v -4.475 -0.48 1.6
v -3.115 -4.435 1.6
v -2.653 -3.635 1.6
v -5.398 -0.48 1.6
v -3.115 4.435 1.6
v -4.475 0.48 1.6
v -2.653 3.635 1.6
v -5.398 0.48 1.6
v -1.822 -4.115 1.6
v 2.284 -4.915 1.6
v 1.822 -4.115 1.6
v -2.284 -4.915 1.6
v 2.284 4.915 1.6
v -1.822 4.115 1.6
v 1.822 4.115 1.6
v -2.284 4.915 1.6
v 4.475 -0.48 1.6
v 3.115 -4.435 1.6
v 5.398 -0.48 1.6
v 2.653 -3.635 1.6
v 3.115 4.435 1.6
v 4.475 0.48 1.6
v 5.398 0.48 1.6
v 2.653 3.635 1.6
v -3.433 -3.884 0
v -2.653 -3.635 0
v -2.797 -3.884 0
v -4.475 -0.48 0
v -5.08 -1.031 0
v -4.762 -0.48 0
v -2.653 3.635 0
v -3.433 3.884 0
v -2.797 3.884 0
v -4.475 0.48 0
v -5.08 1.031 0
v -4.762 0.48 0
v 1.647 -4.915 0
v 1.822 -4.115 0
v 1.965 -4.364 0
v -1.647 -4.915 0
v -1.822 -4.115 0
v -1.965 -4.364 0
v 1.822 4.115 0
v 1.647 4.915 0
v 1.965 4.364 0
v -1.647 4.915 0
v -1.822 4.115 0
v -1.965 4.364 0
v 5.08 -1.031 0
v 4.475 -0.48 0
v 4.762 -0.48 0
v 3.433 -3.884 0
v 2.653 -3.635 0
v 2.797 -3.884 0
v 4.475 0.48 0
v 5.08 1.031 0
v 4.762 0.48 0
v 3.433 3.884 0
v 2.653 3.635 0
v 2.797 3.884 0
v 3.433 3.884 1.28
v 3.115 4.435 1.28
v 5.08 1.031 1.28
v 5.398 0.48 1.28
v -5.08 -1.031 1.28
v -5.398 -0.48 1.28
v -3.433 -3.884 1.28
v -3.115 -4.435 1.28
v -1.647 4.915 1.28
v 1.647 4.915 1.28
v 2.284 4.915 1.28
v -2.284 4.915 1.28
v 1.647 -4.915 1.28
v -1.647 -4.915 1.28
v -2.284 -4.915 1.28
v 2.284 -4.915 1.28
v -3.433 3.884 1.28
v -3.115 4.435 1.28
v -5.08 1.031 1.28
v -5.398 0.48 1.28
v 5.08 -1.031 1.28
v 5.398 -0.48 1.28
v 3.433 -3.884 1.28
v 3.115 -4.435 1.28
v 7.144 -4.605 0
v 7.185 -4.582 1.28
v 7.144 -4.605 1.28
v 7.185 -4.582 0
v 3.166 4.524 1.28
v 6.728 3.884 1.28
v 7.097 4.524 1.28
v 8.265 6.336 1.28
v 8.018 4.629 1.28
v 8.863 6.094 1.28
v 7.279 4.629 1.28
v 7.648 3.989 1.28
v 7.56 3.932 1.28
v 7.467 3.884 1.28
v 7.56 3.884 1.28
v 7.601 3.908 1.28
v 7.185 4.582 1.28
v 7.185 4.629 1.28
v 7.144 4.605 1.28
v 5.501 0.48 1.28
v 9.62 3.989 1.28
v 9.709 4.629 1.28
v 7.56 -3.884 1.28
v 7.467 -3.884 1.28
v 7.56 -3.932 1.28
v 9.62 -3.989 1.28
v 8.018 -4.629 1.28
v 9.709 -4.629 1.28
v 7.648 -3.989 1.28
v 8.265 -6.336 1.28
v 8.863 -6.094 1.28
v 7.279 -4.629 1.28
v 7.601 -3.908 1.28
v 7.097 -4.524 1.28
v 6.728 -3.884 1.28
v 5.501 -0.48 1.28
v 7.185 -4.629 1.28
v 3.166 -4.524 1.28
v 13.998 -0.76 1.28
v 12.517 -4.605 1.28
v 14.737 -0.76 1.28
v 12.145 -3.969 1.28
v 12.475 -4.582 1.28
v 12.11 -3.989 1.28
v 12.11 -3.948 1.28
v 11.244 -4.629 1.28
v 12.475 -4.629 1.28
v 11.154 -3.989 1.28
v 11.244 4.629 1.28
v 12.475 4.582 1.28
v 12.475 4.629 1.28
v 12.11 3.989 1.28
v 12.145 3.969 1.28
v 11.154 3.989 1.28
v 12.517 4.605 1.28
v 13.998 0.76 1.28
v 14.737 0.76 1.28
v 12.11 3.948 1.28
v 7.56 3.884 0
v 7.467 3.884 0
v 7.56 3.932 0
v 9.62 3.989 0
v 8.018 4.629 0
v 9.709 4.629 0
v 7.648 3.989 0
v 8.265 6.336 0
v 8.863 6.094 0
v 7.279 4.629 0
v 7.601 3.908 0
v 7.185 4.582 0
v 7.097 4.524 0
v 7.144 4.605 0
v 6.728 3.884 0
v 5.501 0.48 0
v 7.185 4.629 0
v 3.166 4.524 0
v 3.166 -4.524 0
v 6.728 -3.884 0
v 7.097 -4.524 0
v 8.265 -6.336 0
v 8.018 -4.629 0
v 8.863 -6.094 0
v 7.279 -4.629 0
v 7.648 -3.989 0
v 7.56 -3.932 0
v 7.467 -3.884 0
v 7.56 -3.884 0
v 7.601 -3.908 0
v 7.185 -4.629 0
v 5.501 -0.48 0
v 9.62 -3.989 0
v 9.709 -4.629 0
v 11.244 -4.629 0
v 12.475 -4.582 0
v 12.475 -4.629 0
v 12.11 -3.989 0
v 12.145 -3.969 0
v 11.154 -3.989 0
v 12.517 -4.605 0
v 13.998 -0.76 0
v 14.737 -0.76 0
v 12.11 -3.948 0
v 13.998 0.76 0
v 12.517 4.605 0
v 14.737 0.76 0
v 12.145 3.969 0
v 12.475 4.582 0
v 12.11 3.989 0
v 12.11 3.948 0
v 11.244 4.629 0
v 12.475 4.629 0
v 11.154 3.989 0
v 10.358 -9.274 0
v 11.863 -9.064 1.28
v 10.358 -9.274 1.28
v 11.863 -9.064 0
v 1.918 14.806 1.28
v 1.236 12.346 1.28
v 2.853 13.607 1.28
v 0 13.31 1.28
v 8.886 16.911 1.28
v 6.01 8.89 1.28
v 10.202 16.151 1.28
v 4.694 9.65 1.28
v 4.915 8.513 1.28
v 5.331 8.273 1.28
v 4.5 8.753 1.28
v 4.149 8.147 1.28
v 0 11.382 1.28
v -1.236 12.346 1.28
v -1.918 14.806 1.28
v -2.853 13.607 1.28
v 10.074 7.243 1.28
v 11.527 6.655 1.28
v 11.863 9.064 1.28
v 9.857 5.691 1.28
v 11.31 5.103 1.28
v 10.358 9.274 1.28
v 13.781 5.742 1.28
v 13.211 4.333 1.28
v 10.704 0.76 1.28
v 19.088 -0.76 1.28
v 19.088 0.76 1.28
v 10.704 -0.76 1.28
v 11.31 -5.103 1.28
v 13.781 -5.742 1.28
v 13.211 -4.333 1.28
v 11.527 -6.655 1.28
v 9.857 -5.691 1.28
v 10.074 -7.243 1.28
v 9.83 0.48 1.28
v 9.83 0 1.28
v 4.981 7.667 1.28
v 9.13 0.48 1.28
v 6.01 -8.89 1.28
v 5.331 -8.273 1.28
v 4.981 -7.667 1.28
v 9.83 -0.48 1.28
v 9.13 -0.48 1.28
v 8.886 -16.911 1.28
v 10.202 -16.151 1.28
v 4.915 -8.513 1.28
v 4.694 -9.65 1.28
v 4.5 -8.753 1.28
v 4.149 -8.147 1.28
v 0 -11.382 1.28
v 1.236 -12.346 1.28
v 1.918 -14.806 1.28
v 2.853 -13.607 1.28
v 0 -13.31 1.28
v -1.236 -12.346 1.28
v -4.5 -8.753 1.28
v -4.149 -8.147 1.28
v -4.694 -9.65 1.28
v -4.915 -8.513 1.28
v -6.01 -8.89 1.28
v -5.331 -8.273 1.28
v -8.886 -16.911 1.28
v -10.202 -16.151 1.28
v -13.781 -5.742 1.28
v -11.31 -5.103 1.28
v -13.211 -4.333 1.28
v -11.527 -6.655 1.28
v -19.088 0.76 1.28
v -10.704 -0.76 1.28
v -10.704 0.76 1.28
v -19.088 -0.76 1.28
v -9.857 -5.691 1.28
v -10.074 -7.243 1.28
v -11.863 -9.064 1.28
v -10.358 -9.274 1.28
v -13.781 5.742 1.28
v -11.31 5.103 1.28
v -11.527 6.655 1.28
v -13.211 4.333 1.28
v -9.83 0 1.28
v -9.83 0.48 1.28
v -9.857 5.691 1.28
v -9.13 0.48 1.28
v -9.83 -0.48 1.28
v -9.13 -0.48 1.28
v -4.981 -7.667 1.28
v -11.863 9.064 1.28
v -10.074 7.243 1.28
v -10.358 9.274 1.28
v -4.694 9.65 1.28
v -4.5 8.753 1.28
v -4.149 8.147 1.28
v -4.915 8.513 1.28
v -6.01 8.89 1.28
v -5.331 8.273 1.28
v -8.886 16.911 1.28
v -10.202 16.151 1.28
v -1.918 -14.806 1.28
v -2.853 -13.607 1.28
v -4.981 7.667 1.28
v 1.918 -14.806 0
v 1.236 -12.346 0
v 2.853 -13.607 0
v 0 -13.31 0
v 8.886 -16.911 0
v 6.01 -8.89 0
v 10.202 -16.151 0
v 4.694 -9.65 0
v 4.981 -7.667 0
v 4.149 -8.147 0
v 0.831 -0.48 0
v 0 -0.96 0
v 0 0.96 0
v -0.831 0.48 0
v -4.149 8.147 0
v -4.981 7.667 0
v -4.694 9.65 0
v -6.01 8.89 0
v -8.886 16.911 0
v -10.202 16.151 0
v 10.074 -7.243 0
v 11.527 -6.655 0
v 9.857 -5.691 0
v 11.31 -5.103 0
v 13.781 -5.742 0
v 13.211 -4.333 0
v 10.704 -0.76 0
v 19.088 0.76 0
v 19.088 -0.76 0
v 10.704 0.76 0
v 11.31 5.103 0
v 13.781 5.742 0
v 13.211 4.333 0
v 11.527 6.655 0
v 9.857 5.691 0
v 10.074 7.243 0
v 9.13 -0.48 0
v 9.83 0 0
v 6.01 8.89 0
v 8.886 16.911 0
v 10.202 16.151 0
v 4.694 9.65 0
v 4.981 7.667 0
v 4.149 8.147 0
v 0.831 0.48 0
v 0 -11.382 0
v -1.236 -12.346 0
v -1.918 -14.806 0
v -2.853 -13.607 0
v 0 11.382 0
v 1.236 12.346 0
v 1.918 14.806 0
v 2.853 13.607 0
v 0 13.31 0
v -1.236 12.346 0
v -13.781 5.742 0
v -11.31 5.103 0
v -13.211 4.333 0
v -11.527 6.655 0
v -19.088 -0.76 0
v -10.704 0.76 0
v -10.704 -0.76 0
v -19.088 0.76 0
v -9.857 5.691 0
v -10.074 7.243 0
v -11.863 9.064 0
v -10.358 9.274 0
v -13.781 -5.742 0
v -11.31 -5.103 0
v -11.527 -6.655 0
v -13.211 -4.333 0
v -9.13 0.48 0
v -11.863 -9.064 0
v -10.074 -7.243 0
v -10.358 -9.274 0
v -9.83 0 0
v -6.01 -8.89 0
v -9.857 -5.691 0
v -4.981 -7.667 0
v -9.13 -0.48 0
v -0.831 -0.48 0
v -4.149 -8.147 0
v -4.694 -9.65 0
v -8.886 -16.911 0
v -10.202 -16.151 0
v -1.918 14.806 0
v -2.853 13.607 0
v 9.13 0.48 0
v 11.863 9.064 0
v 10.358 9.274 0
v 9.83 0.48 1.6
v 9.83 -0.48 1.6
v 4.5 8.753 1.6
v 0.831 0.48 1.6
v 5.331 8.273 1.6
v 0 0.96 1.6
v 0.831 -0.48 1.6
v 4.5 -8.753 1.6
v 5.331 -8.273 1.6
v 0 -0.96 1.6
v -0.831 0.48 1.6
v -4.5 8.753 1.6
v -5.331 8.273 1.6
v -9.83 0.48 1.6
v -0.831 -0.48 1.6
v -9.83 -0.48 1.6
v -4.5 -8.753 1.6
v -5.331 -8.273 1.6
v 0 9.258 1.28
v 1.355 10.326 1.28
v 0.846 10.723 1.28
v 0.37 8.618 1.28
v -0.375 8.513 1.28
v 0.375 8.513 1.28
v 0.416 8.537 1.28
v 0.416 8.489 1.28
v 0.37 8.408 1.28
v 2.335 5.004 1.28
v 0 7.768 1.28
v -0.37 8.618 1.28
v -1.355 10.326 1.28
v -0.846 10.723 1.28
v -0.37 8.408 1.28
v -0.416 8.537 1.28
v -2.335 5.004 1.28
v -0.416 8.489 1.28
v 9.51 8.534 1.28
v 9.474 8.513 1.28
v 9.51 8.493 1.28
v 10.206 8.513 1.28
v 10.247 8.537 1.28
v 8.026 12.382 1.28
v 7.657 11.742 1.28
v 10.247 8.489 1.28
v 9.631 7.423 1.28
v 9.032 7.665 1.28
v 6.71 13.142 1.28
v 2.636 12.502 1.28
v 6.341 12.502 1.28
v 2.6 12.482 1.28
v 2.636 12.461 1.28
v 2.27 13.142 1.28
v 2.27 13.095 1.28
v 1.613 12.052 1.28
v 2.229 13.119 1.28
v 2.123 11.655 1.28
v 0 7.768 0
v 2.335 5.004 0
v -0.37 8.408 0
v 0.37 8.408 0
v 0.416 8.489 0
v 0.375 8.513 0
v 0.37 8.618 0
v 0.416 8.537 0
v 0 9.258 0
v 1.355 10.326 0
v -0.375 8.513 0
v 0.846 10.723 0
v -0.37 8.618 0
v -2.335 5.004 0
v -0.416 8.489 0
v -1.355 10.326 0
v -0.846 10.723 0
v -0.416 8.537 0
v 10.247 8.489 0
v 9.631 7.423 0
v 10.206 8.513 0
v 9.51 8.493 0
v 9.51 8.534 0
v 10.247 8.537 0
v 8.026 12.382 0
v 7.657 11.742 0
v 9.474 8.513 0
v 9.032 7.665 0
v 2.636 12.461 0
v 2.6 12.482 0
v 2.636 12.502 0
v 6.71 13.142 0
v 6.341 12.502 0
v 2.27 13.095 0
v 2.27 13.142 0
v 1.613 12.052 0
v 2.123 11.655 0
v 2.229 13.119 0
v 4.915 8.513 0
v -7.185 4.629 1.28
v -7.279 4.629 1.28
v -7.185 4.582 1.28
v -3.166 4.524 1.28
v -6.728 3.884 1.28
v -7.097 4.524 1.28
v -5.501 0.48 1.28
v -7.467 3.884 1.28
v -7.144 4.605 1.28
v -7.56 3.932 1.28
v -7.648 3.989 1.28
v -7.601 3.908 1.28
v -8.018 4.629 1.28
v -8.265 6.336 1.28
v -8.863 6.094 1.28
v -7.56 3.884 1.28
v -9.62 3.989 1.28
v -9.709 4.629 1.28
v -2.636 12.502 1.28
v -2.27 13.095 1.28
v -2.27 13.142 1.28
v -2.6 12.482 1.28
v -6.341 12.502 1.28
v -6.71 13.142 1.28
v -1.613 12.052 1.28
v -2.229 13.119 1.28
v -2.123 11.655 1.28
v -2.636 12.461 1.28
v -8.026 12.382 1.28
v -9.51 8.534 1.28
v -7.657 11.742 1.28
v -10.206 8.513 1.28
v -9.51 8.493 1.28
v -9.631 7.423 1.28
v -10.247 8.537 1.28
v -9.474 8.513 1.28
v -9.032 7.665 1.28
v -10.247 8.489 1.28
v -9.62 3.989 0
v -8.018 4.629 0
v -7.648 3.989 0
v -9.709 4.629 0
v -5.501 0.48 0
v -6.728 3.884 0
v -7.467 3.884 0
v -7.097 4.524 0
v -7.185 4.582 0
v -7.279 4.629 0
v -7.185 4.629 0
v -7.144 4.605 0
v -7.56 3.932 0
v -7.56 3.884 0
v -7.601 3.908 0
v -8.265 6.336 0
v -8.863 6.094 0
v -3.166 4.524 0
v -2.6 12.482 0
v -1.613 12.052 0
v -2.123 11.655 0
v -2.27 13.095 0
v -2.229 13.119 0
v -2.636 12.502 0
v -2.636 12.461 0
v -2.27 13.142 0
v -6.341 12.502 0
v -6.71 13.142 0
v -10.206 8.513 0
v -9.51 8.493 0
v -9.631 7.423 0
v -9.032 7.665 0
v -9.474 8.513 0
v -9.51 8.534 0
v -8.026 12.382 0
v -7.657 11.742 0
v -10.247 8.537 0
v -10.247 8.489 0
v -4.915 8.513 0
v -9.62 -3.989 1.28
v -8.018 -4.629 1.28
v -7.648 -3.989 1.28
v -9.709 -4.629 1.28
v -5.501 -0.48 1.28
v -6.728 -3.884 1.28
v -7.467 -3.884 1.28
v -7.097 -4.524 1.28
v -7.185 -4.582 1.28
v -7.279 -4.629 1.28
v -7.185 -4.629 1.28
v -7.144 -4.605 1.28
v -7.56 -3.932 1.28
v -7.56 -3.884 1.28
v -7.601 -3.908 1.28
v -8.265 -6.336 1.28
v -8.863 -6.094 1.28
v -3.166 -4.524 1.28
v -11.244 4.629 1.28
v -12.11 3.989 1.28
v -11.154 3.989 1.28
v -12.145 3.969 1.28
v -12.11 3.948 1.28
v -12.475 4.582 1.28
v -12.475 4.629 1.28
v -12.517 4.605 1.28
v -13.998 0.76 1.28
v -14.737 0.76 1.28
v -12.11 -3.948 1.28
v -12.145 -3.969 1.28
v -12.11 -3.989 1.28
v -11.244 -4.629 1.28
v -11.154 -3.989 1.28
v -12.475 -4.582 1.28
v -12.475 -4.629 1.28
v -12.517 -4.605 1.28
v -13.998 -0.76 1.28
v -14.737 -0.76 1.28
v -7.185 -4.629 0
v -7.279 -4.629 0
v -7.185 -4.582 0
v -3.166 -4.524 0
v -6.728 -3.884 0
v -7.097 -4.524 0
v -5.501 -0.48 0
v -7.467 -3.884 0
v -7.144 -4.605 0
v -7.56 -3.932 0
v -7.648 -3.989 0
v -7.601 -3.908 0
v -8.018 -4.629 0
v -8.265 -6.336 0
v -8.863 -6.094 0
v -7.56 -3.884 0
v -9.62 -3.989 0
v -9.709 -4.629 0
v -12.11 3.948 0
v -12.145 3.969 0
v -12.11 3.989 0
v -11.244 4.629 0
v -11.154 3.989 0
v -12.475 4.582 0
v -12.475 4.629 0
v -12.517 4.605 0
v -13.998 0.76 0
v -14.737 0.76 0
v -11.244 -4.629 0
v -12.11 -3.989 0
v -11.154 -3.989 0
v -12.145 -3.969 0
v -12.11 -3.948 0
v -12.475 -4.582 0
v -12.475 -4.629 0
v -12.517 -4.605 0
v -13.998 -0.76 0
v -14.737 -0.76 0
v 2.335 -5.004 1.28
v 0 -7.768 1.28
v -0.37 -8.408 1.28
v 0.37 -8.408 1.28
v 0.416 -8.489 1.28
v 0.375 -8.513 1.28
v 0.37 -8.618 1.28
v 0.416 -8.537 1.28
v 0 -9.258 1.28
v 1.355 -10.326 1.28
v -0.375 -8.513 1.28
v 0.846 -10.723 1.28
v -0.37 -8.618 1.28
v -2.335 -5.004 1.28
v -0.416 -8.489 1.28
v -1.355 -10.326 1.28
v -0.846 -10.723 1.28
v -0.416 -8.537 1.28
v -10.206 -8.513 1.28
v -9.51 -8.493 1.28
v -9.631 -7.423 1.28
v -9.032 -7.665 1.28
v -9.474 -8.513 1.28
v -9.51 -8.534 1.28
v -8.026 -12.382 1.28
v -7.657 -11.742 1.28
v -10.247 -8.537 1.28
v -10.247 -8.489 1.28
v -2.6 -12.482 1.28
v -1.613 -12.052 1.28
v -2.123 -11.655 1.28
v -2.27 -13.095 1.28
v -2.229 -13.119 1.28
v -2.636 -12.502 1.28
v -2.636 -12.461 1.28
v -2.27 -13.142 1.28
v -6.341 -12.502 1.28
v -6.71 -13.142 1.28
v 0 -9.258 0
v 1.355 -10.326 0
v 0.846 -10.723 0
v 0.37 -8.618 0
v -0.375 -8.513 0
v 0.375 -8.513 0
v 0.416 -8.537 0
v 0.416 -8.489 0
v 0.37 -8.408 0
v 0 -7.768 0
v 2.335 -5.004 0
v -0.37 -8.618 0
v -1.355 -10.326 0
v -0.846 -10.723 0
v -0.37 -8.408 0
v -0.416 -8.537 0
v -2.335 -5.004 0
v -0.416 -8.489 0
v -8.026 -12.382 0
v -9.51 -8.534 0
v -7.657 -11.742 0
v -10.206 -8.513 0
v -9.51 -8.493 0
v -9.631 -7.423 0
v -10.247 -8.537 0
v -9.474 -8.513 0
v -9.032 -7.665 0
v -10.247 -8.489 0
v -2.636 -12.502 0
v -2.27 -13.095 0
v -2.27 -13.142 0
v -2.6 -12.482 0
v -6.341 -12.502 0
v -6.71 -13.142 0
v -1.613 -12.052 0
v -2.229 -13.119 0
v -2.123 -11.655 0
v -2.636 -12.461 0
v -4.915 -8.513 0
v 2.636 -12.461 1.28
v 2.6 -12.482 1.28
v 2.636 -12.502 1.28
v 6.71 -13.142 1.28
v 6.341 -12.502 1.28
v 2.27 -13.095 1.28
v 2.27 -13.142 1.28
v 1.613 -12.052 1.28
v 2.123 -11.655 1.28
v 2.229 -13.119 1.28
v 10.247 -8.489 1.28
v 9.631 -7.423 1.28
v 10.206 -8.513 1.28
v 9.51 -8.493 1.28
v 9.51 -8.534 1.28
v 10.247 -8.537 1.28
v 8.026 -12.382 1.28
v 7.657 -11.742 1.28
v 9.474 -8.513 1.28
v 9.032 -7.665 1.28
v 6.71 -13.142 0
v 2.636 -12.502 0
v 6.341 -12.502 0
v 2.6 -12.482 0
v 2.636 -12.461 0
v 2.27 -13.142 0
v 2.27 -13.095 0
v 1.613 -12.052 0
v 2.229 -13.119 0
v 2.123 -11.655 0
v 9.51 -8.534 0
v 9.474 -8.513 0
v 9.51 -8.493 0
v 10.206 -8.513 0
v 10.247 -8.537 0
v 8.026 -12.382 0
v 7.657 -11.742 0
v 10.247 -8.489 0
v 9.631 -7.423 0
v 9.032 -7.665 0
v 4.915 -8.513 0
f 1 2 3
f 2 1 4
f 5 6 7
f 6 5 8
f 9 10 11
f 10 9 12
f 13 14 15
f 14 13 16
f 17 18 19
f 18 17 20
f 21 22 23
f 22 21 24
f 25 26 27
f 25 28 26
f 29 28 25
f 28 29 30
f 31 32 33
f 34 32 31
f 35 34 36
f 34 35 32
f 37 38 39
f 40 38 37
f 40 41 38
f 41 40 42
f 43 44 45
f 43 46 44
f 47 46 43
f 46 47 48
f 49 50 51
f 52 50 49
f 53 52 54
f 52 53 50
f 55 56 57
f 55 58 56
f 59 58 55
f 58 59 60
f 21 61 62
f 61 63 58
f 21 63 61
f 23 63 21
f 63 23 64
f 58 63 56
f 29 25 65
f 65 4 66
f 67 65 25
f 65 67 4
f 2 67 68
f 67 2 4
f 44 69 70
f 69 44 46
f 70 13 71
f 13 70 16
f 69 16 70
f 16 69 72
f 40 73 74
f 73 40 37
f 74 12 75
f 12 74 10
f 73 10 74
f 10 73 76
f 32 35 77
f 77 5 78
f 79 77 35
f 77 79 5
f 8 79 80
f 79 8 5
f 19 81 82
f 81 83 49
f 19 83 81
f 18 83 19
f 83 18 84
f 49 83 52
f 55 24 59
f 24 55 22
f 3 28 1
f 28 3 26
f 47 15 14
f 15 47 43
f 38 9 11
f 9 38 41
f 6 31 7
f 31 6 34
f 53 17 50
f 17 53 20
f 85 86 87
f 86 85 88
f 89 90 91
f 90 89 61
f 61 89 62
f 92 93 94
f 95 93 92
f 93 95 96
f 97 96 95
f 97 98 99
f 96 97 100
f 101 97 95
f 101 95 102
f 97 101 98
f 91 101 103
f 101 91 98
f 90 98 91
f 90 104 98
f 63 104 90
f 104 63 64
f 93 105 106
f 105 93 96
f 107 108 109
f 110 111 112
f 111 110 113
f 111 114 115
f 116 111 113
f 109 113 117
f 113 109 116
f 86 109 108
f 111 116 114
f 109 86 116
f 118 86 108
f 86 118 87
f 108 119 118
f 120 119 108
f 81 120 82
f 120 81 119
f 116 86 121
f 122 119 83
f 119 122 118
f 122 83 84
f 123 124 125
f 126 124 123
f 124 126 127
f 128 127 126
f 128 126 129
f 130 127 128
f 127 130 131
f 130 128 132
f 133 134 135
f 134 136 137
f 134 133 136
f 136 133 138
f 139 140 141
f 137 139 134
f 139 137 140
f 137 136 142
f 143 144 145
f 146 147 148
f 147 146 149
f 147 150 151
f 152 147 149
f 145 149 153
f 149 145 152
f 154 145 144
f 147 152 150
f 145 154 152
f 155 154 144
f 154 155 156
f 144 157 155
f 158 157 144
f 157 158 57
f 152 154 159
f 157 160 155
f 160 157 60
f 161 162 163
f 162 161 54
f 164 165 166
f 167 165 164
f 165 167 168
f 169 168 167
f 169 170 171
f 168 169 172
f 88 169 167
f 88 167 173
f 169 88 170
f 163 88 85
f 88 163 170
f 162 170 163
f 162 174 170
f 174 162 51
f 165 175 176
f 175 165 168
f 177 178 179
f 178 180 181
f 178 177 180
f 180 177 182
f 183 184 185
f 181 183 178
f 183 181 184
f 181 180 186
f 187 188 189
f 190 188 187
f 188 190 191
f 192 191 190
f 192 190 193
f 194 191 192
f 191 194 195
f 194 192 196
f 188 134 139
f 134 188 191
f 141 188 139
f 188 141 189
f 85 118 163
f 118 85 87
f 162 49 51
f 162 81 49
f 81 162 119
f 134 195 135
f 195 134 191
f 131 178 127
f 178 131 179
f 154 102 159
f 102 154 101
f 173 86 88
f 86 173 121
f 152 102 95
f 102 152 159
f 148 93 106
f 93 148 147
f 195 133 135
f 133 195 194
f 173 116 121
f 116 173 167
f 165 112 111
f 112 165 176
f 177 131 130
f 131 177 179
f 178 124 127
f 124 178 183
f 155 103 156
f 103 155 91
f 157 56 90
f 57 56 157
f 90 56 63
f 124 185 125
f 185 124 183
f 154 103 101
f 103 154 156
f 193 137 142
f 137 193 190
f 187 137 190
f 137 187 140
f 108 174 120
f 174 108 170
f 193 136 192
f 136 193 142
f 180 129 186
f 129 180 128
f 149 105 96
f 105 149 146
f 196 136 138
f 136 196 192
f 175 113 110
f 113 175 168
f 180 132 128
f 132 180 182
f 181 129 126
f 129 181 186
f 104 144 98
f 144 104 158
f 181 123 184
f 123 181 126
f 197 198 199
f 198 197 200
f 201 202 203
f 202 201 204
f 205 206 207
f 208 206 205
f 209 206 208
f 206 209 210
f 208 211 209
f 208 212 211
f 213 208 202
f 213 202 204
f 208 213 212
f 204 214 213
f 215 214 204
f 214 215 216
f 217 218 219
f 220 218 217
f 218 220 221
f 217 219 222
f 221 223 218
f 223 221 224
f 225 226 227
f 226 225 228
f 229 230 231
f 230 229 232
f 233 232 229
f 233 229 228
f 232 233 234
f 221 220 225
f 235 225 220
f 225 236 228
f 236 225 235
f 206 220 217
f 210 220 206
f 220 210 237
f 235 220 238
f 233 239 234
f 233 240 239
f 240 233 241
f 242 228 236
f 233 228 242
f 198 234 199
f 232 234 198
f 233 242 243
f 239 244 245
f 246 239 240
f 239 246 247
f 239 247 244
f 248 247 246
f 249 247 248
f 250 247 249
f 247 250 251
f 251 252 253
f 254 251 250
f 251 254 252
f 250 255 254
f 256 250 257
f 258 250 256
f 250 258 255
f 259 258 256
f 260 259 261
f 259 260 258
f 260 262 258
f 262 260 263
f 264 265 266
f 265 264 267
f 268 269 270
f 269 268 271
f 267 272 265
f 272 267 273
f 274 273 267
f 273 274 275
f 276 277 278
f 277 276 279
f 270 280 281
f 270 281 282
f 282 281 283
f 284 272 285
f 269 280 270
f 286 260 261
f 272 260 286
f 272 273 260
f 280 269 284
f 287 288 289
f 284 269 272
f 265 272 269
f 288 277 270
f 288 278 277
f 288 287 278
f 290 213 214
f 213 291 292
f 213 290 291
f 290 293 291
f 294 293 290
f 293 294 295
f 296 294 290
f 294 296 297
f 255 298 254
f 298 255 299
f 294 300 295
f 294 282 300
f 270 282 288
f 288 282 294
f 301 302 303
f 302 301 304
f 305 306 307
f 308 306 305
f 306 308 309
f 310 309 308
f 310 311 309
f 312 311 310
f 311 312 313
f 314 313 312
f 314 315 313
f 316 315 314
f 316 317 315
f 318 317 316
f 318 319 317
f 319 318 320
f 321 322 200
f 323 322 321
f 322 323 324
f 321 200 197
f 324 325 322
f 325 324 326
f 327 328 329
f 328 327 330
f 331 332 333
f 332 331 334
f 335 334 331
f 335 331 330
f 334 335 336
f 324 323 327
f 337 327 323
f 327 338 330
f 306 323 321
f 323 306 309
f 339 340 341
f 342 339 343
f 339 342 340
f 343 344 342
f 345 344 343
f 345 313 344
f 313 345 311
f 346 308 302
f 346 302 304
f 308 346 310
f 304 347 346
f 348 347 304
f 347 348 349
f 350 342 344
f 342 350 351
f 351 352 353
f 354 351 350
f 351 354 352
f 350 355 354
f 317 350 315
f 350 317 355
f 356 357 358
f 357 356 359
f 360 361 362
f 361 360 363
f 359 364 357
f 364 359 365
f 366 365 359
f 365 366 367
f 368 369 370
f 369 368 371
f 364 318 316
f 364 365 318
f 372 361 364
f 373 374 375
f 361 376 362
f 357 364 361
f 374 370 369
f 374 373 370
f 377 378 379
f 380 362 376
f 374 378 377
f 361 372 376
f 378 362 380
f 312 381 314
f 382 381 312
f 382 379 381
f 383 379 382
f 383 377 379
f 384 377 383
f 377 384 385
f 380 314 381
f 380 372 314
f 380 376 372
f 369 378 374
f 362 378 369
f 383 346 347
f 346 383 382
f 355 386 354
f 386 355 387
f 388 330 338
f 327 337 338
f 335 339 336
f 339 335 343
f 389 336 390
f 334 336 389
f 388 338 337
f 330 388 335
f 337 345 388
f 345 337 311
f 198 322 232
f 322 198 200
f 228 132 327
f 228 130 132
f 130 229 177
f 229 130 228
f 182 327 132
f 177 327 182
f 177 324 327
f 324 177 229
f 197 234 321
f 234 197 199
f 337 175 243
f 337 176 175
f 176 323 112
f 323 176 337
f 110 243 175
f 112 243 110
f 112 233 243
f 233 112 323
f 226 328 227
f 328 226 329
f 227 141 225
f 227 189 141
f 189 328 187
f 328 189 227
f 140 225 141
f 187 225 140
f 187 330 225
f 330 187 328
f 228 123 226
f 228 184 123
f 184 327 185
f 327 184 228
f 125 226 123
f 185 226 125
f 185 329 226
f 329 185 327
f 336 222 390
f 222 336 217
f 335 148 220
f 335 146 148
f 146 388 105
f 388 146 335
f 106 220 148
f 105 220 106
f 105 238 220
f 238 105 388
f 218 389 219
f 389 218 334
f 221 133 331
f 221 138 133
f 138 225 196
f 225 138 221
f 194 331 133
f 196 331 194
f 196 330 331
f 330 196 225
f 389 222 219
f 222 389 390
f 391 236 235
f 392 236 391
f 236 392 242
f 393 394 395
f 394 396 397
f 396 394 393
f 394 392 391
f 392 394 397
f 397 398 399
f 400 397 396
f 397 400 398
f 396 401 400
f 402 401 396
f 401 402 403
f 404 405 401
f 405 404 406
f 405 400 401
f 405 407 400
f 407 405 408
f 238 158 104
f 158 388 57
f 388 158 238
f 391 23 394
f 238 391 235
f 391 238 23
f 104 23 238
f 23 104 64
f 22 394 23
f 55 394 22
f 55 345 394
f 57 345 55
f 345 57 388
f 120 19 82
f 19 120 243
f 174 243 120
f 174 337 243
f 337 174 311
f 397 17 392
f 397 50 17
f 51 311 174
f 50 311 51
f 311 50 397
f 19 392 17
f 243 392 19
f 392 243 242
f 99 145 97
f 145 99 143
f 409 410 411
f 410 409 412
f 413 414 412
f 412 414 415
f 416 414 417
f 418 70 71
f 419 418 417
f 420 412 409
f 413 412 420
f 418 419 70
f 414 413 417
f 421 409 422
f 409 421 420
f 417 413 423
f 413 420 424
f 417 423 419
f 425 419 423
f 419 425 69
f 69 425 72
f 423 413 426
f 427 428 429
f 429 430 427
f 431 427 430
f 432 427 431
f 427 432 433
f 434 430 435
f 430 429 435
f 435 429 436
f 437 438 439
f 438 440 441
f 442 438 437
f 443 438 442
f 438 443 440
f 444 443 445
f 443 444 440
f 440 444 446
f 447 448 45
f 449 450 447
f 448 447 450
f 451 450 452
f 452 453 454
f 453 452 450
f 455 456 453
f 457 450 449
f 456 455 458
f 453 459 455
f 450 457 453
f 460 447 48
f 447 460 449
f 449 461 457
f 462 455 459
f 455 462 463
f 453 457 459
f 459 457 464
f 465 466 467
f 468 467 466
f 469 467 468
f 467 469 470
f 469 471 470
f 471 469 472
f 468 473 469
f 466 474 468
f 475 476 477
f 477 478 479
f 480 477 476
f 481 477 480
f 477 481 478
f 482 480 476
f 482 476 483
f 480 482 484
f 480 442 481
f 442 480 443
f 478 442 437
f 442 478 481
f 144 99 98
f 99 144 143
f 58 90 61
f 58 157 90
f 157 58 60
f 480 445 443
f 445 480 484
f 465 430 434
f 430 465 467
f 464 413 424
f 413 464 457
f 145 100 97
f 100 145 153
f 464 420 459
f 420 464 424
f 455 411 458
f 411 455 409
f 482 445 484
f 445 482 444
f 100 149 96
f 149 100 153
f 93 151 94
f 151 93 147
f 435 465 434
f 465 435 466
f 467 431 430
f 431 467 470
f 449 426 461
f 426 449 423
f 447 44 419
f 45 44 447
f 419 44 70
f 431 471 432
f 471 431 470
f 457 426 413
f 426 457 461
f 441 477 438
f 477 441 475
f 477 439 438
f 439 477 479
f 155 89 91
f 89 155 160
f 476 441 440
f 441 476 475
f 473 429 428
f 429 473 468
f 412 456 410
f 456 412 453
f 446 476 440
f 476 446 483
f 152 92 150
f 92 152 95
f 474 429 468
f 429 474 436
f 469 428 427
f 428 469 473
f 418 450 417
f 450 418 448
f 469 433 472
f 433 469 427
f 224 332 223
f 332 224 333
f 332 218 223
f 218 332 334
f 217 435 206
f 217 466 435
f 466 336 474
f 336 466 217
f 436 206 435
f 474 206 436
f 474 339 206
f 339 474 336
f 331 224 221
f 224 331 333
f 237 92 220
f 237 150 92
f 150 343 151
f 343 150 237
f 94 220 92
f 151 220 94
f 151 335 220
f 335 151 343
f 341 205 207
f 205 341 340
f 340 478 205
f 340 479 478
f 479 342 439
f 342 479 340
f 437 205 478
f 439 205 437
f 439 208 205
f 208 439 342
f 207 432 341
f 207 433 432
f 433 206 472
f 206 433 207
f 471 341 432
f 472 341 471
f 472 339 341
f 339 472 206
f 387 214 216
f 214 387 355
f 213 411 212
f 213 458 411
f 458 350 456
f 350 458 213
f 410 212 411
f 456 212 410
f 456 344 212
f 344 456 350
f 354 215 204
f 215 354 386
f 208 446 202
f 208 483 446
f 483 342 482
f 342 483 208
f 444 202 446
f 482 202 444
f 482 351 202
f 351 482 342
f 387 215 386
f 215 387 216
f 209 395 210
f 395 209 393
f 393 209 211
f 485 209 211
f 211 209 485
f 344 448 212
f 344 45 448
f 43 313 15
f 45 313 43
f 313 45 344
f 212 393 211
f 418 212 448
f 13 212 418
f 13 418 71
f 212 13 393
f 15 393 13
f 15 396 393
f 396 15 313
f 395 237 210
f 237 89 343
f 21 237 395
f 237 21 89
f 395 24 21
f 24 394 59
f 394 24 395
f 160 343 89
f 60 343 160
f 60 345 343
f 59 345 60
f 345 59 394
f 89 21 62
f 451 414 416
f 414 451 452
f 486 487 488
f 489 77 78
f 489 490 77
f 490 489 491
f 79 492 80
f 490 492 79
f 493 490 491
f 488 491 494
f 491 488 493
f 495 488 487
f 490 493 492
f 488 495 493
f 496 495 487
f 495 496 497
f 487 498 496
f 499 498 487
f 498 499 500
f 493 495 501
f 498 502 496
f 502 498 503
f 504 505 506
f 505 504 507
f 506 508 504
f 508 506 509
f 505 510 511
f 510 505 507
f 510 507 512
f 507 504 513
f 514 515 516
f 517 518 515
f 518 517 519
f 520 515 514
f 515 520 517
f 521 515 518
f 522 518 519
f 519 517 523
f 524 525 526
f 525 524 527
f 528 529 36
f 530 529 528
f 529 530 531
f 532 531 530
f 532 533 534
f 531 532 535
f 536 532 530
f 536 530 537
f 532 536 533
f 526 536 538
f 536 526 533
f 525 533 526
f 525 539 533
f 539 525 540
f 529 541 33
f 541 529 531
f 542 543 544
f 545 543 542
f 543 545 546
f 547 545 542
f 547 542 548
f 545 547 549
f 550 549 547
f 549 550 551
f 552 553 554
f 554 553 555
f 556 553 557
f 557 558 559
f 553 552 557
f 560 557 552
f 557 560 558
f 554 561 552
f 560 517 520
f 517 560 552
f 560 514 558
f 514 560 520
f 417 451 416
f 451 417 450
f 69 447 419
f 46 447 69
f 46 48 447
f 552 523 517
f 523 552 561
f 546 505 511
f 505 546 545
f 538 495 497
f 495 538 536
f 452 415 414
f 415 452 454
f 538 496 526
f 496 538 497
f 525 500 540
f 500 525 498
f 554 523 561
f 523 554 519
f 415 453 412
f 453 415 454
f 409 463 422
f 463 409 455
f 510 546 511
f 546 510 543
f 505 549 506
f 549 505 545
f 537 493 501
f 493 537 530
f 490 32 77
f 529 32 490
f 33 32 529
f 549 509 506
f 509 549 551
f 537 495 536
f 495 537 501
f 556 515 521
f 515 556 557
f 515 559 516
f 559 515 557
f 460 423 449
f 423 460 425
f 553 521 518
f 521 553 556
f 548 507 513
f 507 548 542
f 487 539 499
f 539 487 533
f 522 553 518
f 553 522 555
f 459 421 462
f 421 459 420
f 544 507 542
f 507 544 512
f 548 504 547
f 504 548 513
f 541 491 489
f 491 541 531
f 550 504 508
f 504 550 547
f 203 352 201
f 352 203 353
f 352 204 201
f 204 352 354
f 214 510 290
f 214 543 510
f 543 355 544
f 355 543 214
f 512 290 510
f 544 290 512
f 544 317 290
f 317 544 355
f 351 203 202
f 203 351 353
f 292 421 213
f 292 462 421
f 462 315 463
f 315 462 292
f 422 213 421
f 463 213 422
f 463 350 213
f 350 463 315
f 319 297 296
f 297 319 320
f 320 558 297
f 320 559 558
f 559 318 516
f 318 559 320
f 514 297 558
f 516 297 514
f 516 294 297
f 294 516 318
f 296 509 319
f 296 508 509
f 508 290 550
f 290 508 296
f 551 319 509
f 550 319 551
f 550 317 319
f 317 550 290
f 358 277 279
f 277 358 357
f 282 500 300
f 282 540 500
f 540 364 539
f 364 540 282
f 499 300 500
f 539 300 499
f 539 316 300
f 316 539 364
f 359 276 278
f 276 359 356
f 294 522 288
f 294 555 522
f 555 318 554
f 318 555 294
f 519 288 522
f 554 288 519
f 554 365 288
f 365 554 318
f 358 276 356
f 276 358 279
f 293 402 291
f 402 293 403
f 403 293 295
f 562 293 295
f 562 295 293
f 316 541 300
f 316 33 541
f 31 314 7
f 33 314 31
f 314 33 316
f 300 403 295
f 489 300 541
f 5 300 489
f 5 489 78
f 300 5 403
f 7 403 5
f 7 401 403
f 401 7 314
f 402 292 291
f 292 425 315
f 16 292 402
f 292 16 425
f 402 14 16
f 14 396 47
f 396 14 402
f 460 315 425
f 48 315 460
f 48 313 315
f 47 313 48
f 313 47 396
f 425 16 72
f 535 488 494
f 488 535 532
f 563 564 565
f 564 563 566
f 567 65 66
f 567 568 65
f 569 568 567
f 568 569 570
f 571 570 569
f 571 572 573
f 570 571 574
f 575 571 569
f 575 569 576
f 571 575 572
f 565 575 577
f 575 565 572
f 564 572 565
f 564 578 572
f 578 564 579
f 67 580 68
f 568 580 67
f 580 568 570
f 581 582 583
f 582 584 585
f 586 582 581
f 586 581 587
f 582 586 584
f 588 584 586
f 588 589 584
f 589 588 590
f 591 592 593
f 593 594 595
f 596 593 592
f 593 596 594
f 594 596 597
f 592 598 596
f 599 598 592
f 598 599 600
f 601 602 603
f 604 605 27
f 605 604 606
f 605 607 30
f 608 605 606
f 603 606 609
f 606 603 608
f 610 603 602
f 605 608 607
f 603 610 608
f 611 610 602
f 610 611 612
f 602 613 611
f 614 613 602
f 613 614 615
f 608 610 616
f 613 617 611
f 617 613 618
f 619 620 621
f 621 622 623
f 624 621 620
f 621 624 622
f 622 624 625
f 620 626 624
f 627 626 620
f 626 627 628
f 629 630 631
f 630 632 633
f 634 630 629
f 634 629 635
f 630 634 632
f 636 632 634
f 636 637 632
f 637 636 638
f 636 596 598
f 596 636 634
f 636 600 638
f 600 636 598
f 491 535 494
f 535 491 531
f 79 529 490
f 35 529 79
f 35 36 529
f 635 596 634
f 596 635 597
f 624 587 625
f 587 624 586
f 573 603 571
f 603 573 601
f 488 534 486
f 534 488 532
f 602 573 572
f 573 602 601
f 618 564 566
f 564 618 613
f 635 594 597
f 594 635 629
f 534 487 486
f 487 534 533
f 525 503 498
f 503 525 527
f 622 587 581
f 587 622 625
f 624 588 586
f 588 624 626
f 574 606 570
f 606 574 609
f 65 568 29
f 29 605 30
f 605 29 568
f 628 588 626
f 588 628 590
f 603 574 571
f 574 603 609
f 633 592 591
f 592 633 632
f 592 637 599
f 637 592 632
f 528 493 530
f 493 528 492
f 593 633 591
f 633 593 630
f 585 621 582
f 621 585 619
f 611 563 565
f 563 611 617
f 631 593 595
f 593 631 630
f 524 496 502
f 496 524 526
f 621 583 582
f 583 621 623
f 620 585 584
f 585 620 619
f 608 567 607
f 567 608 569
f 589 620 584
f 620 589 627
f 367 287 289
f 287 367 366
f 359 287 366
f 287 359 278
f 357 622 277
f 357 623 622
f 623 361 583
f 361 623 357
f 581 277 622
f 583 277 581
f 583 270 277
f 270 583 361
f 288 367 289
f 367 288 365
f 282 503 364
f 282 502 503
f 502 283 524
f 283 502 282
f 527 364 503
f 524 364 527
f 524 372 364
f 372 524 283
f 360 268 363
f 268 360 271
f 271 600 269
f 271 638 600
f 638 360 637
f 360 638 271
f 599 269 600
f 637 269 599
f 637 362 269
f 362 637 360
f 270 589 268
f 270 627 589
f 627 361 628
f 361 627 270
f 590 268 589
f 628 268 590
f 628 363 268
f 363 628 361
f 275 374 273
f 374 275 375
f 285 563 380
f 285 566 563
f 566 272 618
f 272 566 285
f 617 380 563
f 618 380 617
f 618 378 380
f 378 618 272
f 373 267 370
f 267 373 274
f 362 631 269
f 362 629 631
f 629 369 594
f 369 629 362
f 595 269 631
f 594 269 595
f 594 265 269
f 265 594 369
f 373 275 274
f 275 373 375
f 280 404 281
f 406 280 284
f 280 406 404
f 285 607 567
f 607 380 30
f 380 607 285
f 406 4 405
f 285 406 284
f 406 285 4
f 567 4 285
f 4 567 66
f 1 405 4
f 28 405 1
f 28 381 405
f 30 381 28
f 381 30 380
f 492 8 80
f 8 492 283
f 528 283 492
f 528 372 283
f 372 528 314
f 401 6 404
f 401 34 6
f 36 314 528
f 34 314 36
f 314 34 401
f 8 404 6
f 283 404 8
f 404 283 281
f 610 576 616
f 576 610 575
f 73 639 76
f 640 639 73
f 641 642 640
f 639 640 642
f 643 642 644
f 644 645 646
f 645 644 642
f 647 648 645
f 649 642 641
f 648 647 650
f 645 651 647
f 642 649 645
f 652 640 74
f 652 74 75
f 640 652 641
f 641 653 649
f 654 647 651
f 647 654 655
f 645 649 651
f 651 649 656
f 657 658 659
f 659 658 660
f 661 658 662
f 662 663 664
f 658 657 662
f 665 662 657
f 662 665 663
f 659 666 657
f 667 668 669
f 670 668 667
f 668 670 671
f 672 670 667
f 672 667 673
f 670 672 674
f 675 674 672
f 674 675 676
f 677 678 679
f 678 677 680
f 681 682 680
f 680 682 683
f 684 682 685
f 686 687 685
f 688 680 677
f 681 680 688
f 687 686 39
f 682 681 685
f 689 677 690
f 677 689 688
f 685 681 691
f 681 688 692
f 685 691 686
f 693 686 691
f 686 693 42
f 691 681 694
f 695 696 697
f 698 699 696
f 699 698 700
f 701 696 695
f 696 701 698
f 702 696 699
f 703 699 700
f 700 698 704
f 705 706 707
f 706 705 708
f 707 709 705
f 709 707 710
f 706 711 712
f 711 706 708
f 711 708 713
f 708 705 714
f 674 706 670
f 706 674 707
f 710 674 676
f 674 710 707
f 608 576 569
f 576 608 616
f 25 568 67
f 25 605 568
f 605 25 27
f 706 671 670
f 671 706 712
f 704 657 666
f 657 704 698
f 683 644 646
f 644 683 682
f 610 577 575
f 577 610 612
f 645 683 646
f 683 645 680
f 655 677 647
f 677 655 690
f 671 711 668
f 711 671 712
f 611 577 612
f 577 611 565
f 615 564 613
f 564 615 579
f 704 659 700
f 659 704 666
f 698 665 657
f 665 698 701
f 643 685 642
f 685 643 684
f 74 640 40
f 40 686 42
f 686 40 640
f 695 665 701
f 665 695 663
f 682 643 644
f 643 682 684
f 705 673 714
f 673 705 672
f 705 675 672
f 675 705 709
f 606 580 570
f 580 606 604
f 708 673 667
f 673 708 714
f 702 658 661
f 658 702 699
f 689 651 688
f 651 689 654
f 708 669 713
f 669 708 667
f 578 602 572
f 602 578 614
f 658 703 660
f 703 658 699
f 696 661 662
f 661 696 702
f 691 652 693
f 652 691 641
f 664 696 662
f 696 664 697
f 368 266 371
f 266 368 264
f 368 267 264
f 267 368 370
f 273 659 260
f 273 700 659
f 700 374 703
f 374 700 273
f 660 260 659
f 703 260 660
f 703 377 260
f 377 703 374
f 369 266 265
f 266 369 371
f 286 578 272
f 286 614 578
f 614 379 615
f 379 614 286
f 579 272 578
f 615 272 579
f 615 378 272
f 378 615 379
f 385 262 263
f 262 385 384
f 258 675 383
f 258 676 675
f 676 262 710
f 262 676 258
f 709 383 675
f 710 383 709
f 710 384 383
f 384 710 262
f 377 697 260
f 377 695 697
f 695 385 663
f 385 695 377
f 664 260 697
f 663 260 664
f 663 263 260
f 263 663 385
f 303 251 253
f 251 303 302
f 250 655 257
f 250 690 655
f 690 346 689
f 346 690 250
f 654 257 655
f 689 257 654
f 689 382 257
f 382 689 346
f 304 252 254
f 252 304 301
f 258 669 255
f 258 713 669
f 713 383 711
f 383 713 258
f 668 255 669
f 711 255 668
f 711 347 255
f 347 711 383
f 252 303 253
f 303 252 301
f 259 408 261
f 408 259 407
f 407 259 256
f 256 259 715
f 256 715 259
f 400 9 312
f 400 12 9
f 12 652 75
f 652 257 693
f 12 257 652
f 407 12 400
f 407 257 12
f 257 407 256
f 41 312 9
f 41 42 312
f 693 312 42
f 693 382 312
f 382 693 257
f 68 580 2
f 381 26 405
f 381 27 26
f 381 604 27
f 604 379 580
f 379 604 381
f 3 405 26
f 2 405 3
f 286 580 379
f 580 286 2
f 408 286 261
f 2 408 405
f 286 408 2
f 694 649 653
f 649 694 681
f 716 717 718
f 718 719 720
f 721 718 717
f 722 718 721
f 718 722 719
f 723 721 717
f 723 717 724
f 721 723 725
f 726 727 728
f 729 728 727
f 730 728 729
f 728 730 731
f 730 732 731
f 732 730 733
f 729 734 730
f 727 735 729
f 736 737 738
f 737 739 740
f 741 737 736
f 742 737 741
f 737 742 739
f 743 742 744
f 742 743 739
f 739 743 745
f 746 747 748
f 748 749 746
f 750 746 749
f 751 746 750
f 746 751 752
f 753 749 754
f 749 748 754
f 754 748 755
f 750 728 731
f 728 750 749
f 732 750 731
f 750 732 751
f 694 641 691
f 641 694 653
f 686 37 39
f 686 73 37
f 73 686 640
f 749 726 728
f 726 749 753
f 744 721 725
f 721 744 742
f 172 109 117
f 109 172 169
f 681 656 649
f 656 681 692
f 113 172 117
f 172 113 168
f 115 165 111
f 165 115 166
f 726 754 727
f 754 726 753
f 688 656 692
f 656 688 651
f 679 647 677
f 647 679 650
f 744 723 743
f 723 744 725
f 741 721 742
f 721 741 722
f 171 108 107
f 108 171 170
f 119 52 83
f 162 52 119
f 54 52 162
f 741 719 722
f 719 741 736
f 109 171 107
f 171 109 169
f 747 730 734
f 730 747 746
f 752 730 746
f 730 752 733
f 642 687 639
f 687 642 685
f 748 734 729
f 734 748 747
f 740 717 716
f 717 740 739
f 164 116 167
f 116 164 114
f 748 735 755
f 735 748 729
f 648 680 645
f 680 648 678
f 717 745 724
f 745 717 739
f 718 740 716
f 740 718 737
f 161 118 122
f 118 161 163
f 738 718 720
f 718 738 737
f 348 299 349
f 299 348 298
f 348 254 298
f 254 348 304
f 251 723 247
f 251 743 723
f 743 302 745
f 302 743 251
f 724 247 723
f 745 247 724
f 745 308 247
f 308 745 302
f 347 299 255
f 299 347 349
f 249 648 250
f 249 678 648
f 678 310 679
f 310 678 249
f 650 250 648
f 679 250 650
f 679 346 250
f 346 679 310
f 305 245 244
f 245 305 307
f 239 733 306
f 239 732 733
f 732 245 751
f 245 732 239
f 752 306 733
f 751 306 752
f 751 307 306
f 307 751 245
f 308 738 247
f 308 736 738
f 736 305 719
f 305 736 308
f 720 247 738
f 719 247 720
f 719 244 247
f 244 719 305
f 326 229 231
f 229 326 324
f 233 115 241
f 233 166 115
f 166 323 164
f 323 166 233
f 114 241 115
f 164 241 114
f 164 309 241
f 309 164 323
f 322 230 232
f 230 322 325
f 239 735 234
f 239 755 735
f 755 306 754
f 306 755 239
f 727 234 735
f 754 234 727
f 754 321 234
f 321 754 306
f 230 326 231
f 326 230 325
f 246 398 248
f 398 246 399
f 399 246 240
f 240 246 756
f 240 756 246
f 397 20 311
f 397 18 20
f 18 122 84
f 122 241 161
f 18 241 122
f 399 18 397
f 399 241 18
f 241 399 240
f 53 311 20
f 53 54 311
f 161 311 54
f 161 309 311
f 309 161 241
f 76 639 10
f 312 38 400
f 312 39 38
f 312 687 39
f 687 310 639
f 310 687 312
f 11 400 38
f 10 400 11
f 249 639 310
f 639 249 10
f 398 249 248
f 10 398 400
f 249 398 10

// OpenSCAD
// Parametric Snowflakes
// (c) 2012 Laird Popkin

// Randomly generate snowflakes. The basic approach is to draw six
// radial arms out from the center, then recursively draw arms out from 
// the ands of the first arms, and so on. For a random number of
// layers of recursion. Also, randomly draw hexagons.

// Arrays of parameters. Foo[0] is center, [1] is first layer out, [2] is
// second layer, etc.

// Snowflake number
seed=1; //Enter a number
echo(str("Seed ",seed));

seeds=rands(0,1000000,7,seed);
echo(str("Seeds ",seeds));

hex = rands(0,1,6,seeds[0]);			// Should this layer have hexagons? >0.5 = yes.
echo("hex ",hex);
hsolid = rands(0,1,6,seeds[1]);		// should hexagons be solid? >0.5 = yes.
echo("hex solid ",hsolid); 
hhex = rands(0,1,6,seeds[2]);			// Should there be an inner hexagon? >0.5 = yes.
echo("hhex ",hhex);
length = rands(5,20,6,seeds[3]);		// length of lines for this layer
echo("length ",length);
width = rands(0.2,2,6,seeds[4]);		// width of lines for this layer
echo("width ",width);
angle = rands(60,120,6,seeds[5]);	// angle for arms for next layer
echo("angle ",angle);

depth = rands(1,4,1,,seeds[6])[0];	// number of layers to draw.
echo("depth ",depth);

scaleh=0.8 * 1;						// each layer is 0.9x previous layer height
// Height
height0=2 * 1;						// height of snowflake in mm
height=[height0,height0*scaleh,height0*pow(scaleh,2), height0*pow(scaleh,3), height0*pow(scaleh,4), height0*pow(scaleh,5), height0*pow(scaleh,6)];
//echo("height ",height);


if (hex[0]) drawhex(length[1], height[1], hsolid[1]);

for (angle1 = [0 : 60 : 359]) {	// then six radial arms
	rotate(angle1)arm();
	}

module arm() {
	translate ([0,-width[1]/2,0]) {
		cube([length[1],width[1],height[1]]);
		translate ([length[1],width[1]/2,0]) {
			if (hex[1]>.5) drawhex(length[2], height[2], hsolid[2]);
			if (hhex[1]>.5) drawhex(length[2]/2, height[2], hsolid[2]);
			if (depth>1) {
				rotate(-angle[1]) arm2();
				arm2();
				rotate(angle[1]) arm2();
				}
			}
		}
	}

module arm2() {
	translate ([0,-width[2]/2,0]) {
		cube([length[2],width[2],height[2]]);
		translate ([length[2],width[2]/2,0]) {
			if (hex[2]>.5) drawhex(length[3], height[3], hsolid[3]);
			if (hhex[2]>.5) drawhex(length[3]/2, height[3], hsolid[3]);
			if (depth>2) {
				rotate(-angle[2]) arm3();
				arm3();
				rotate(angle[2]) arm3();
				}
			}
		}
	}

module arm3() {
	translate ([0,-width[3]/2,0]) {
		cube([length[3],width[3],height[3]]);
		translate ([length[3],width[3]/2,0]) {
			if (hex[3]>.5) drawhex(length[4], height[4], hsolid[4]);
			if (hhex[3]>.5) drawhex(length[4]/2, height[4], hsolid[4]);
			if (depth>3) {
				rotate(-angle[3]) arm4();
				arm4();
				rotate(angle[3]) arm4();
				}
			}
		}
	}

module arm4() {
	translate ([0,-width[4]/2,0]) {
		cube([length[4],width[4],height[4]]);
		translate ([length[4],width[4]/2,0]) {
			if (hex[4]>.5) drawhex(length[5], height[5]);
			if (hhex[4]>.5) drawhex(length[5]/2, height[5]);
			}
		}
	}

module drawhex(size, height, s) {
	translate([0,0,height/2]) difference() {
		hexagon(size, height);
		if (s>0.5) translate([0,0,-0.5]) hexagon(size-height, height+1);
		}
	}

// size is the XY plane size, height in Z
module hexagon(size, height) {
	boxWidth = size/1.75;
	for (r = [-60, 0, 60]) rotate([0,0,r]) 
		cube([boxWidth, size, height], true);
	}
